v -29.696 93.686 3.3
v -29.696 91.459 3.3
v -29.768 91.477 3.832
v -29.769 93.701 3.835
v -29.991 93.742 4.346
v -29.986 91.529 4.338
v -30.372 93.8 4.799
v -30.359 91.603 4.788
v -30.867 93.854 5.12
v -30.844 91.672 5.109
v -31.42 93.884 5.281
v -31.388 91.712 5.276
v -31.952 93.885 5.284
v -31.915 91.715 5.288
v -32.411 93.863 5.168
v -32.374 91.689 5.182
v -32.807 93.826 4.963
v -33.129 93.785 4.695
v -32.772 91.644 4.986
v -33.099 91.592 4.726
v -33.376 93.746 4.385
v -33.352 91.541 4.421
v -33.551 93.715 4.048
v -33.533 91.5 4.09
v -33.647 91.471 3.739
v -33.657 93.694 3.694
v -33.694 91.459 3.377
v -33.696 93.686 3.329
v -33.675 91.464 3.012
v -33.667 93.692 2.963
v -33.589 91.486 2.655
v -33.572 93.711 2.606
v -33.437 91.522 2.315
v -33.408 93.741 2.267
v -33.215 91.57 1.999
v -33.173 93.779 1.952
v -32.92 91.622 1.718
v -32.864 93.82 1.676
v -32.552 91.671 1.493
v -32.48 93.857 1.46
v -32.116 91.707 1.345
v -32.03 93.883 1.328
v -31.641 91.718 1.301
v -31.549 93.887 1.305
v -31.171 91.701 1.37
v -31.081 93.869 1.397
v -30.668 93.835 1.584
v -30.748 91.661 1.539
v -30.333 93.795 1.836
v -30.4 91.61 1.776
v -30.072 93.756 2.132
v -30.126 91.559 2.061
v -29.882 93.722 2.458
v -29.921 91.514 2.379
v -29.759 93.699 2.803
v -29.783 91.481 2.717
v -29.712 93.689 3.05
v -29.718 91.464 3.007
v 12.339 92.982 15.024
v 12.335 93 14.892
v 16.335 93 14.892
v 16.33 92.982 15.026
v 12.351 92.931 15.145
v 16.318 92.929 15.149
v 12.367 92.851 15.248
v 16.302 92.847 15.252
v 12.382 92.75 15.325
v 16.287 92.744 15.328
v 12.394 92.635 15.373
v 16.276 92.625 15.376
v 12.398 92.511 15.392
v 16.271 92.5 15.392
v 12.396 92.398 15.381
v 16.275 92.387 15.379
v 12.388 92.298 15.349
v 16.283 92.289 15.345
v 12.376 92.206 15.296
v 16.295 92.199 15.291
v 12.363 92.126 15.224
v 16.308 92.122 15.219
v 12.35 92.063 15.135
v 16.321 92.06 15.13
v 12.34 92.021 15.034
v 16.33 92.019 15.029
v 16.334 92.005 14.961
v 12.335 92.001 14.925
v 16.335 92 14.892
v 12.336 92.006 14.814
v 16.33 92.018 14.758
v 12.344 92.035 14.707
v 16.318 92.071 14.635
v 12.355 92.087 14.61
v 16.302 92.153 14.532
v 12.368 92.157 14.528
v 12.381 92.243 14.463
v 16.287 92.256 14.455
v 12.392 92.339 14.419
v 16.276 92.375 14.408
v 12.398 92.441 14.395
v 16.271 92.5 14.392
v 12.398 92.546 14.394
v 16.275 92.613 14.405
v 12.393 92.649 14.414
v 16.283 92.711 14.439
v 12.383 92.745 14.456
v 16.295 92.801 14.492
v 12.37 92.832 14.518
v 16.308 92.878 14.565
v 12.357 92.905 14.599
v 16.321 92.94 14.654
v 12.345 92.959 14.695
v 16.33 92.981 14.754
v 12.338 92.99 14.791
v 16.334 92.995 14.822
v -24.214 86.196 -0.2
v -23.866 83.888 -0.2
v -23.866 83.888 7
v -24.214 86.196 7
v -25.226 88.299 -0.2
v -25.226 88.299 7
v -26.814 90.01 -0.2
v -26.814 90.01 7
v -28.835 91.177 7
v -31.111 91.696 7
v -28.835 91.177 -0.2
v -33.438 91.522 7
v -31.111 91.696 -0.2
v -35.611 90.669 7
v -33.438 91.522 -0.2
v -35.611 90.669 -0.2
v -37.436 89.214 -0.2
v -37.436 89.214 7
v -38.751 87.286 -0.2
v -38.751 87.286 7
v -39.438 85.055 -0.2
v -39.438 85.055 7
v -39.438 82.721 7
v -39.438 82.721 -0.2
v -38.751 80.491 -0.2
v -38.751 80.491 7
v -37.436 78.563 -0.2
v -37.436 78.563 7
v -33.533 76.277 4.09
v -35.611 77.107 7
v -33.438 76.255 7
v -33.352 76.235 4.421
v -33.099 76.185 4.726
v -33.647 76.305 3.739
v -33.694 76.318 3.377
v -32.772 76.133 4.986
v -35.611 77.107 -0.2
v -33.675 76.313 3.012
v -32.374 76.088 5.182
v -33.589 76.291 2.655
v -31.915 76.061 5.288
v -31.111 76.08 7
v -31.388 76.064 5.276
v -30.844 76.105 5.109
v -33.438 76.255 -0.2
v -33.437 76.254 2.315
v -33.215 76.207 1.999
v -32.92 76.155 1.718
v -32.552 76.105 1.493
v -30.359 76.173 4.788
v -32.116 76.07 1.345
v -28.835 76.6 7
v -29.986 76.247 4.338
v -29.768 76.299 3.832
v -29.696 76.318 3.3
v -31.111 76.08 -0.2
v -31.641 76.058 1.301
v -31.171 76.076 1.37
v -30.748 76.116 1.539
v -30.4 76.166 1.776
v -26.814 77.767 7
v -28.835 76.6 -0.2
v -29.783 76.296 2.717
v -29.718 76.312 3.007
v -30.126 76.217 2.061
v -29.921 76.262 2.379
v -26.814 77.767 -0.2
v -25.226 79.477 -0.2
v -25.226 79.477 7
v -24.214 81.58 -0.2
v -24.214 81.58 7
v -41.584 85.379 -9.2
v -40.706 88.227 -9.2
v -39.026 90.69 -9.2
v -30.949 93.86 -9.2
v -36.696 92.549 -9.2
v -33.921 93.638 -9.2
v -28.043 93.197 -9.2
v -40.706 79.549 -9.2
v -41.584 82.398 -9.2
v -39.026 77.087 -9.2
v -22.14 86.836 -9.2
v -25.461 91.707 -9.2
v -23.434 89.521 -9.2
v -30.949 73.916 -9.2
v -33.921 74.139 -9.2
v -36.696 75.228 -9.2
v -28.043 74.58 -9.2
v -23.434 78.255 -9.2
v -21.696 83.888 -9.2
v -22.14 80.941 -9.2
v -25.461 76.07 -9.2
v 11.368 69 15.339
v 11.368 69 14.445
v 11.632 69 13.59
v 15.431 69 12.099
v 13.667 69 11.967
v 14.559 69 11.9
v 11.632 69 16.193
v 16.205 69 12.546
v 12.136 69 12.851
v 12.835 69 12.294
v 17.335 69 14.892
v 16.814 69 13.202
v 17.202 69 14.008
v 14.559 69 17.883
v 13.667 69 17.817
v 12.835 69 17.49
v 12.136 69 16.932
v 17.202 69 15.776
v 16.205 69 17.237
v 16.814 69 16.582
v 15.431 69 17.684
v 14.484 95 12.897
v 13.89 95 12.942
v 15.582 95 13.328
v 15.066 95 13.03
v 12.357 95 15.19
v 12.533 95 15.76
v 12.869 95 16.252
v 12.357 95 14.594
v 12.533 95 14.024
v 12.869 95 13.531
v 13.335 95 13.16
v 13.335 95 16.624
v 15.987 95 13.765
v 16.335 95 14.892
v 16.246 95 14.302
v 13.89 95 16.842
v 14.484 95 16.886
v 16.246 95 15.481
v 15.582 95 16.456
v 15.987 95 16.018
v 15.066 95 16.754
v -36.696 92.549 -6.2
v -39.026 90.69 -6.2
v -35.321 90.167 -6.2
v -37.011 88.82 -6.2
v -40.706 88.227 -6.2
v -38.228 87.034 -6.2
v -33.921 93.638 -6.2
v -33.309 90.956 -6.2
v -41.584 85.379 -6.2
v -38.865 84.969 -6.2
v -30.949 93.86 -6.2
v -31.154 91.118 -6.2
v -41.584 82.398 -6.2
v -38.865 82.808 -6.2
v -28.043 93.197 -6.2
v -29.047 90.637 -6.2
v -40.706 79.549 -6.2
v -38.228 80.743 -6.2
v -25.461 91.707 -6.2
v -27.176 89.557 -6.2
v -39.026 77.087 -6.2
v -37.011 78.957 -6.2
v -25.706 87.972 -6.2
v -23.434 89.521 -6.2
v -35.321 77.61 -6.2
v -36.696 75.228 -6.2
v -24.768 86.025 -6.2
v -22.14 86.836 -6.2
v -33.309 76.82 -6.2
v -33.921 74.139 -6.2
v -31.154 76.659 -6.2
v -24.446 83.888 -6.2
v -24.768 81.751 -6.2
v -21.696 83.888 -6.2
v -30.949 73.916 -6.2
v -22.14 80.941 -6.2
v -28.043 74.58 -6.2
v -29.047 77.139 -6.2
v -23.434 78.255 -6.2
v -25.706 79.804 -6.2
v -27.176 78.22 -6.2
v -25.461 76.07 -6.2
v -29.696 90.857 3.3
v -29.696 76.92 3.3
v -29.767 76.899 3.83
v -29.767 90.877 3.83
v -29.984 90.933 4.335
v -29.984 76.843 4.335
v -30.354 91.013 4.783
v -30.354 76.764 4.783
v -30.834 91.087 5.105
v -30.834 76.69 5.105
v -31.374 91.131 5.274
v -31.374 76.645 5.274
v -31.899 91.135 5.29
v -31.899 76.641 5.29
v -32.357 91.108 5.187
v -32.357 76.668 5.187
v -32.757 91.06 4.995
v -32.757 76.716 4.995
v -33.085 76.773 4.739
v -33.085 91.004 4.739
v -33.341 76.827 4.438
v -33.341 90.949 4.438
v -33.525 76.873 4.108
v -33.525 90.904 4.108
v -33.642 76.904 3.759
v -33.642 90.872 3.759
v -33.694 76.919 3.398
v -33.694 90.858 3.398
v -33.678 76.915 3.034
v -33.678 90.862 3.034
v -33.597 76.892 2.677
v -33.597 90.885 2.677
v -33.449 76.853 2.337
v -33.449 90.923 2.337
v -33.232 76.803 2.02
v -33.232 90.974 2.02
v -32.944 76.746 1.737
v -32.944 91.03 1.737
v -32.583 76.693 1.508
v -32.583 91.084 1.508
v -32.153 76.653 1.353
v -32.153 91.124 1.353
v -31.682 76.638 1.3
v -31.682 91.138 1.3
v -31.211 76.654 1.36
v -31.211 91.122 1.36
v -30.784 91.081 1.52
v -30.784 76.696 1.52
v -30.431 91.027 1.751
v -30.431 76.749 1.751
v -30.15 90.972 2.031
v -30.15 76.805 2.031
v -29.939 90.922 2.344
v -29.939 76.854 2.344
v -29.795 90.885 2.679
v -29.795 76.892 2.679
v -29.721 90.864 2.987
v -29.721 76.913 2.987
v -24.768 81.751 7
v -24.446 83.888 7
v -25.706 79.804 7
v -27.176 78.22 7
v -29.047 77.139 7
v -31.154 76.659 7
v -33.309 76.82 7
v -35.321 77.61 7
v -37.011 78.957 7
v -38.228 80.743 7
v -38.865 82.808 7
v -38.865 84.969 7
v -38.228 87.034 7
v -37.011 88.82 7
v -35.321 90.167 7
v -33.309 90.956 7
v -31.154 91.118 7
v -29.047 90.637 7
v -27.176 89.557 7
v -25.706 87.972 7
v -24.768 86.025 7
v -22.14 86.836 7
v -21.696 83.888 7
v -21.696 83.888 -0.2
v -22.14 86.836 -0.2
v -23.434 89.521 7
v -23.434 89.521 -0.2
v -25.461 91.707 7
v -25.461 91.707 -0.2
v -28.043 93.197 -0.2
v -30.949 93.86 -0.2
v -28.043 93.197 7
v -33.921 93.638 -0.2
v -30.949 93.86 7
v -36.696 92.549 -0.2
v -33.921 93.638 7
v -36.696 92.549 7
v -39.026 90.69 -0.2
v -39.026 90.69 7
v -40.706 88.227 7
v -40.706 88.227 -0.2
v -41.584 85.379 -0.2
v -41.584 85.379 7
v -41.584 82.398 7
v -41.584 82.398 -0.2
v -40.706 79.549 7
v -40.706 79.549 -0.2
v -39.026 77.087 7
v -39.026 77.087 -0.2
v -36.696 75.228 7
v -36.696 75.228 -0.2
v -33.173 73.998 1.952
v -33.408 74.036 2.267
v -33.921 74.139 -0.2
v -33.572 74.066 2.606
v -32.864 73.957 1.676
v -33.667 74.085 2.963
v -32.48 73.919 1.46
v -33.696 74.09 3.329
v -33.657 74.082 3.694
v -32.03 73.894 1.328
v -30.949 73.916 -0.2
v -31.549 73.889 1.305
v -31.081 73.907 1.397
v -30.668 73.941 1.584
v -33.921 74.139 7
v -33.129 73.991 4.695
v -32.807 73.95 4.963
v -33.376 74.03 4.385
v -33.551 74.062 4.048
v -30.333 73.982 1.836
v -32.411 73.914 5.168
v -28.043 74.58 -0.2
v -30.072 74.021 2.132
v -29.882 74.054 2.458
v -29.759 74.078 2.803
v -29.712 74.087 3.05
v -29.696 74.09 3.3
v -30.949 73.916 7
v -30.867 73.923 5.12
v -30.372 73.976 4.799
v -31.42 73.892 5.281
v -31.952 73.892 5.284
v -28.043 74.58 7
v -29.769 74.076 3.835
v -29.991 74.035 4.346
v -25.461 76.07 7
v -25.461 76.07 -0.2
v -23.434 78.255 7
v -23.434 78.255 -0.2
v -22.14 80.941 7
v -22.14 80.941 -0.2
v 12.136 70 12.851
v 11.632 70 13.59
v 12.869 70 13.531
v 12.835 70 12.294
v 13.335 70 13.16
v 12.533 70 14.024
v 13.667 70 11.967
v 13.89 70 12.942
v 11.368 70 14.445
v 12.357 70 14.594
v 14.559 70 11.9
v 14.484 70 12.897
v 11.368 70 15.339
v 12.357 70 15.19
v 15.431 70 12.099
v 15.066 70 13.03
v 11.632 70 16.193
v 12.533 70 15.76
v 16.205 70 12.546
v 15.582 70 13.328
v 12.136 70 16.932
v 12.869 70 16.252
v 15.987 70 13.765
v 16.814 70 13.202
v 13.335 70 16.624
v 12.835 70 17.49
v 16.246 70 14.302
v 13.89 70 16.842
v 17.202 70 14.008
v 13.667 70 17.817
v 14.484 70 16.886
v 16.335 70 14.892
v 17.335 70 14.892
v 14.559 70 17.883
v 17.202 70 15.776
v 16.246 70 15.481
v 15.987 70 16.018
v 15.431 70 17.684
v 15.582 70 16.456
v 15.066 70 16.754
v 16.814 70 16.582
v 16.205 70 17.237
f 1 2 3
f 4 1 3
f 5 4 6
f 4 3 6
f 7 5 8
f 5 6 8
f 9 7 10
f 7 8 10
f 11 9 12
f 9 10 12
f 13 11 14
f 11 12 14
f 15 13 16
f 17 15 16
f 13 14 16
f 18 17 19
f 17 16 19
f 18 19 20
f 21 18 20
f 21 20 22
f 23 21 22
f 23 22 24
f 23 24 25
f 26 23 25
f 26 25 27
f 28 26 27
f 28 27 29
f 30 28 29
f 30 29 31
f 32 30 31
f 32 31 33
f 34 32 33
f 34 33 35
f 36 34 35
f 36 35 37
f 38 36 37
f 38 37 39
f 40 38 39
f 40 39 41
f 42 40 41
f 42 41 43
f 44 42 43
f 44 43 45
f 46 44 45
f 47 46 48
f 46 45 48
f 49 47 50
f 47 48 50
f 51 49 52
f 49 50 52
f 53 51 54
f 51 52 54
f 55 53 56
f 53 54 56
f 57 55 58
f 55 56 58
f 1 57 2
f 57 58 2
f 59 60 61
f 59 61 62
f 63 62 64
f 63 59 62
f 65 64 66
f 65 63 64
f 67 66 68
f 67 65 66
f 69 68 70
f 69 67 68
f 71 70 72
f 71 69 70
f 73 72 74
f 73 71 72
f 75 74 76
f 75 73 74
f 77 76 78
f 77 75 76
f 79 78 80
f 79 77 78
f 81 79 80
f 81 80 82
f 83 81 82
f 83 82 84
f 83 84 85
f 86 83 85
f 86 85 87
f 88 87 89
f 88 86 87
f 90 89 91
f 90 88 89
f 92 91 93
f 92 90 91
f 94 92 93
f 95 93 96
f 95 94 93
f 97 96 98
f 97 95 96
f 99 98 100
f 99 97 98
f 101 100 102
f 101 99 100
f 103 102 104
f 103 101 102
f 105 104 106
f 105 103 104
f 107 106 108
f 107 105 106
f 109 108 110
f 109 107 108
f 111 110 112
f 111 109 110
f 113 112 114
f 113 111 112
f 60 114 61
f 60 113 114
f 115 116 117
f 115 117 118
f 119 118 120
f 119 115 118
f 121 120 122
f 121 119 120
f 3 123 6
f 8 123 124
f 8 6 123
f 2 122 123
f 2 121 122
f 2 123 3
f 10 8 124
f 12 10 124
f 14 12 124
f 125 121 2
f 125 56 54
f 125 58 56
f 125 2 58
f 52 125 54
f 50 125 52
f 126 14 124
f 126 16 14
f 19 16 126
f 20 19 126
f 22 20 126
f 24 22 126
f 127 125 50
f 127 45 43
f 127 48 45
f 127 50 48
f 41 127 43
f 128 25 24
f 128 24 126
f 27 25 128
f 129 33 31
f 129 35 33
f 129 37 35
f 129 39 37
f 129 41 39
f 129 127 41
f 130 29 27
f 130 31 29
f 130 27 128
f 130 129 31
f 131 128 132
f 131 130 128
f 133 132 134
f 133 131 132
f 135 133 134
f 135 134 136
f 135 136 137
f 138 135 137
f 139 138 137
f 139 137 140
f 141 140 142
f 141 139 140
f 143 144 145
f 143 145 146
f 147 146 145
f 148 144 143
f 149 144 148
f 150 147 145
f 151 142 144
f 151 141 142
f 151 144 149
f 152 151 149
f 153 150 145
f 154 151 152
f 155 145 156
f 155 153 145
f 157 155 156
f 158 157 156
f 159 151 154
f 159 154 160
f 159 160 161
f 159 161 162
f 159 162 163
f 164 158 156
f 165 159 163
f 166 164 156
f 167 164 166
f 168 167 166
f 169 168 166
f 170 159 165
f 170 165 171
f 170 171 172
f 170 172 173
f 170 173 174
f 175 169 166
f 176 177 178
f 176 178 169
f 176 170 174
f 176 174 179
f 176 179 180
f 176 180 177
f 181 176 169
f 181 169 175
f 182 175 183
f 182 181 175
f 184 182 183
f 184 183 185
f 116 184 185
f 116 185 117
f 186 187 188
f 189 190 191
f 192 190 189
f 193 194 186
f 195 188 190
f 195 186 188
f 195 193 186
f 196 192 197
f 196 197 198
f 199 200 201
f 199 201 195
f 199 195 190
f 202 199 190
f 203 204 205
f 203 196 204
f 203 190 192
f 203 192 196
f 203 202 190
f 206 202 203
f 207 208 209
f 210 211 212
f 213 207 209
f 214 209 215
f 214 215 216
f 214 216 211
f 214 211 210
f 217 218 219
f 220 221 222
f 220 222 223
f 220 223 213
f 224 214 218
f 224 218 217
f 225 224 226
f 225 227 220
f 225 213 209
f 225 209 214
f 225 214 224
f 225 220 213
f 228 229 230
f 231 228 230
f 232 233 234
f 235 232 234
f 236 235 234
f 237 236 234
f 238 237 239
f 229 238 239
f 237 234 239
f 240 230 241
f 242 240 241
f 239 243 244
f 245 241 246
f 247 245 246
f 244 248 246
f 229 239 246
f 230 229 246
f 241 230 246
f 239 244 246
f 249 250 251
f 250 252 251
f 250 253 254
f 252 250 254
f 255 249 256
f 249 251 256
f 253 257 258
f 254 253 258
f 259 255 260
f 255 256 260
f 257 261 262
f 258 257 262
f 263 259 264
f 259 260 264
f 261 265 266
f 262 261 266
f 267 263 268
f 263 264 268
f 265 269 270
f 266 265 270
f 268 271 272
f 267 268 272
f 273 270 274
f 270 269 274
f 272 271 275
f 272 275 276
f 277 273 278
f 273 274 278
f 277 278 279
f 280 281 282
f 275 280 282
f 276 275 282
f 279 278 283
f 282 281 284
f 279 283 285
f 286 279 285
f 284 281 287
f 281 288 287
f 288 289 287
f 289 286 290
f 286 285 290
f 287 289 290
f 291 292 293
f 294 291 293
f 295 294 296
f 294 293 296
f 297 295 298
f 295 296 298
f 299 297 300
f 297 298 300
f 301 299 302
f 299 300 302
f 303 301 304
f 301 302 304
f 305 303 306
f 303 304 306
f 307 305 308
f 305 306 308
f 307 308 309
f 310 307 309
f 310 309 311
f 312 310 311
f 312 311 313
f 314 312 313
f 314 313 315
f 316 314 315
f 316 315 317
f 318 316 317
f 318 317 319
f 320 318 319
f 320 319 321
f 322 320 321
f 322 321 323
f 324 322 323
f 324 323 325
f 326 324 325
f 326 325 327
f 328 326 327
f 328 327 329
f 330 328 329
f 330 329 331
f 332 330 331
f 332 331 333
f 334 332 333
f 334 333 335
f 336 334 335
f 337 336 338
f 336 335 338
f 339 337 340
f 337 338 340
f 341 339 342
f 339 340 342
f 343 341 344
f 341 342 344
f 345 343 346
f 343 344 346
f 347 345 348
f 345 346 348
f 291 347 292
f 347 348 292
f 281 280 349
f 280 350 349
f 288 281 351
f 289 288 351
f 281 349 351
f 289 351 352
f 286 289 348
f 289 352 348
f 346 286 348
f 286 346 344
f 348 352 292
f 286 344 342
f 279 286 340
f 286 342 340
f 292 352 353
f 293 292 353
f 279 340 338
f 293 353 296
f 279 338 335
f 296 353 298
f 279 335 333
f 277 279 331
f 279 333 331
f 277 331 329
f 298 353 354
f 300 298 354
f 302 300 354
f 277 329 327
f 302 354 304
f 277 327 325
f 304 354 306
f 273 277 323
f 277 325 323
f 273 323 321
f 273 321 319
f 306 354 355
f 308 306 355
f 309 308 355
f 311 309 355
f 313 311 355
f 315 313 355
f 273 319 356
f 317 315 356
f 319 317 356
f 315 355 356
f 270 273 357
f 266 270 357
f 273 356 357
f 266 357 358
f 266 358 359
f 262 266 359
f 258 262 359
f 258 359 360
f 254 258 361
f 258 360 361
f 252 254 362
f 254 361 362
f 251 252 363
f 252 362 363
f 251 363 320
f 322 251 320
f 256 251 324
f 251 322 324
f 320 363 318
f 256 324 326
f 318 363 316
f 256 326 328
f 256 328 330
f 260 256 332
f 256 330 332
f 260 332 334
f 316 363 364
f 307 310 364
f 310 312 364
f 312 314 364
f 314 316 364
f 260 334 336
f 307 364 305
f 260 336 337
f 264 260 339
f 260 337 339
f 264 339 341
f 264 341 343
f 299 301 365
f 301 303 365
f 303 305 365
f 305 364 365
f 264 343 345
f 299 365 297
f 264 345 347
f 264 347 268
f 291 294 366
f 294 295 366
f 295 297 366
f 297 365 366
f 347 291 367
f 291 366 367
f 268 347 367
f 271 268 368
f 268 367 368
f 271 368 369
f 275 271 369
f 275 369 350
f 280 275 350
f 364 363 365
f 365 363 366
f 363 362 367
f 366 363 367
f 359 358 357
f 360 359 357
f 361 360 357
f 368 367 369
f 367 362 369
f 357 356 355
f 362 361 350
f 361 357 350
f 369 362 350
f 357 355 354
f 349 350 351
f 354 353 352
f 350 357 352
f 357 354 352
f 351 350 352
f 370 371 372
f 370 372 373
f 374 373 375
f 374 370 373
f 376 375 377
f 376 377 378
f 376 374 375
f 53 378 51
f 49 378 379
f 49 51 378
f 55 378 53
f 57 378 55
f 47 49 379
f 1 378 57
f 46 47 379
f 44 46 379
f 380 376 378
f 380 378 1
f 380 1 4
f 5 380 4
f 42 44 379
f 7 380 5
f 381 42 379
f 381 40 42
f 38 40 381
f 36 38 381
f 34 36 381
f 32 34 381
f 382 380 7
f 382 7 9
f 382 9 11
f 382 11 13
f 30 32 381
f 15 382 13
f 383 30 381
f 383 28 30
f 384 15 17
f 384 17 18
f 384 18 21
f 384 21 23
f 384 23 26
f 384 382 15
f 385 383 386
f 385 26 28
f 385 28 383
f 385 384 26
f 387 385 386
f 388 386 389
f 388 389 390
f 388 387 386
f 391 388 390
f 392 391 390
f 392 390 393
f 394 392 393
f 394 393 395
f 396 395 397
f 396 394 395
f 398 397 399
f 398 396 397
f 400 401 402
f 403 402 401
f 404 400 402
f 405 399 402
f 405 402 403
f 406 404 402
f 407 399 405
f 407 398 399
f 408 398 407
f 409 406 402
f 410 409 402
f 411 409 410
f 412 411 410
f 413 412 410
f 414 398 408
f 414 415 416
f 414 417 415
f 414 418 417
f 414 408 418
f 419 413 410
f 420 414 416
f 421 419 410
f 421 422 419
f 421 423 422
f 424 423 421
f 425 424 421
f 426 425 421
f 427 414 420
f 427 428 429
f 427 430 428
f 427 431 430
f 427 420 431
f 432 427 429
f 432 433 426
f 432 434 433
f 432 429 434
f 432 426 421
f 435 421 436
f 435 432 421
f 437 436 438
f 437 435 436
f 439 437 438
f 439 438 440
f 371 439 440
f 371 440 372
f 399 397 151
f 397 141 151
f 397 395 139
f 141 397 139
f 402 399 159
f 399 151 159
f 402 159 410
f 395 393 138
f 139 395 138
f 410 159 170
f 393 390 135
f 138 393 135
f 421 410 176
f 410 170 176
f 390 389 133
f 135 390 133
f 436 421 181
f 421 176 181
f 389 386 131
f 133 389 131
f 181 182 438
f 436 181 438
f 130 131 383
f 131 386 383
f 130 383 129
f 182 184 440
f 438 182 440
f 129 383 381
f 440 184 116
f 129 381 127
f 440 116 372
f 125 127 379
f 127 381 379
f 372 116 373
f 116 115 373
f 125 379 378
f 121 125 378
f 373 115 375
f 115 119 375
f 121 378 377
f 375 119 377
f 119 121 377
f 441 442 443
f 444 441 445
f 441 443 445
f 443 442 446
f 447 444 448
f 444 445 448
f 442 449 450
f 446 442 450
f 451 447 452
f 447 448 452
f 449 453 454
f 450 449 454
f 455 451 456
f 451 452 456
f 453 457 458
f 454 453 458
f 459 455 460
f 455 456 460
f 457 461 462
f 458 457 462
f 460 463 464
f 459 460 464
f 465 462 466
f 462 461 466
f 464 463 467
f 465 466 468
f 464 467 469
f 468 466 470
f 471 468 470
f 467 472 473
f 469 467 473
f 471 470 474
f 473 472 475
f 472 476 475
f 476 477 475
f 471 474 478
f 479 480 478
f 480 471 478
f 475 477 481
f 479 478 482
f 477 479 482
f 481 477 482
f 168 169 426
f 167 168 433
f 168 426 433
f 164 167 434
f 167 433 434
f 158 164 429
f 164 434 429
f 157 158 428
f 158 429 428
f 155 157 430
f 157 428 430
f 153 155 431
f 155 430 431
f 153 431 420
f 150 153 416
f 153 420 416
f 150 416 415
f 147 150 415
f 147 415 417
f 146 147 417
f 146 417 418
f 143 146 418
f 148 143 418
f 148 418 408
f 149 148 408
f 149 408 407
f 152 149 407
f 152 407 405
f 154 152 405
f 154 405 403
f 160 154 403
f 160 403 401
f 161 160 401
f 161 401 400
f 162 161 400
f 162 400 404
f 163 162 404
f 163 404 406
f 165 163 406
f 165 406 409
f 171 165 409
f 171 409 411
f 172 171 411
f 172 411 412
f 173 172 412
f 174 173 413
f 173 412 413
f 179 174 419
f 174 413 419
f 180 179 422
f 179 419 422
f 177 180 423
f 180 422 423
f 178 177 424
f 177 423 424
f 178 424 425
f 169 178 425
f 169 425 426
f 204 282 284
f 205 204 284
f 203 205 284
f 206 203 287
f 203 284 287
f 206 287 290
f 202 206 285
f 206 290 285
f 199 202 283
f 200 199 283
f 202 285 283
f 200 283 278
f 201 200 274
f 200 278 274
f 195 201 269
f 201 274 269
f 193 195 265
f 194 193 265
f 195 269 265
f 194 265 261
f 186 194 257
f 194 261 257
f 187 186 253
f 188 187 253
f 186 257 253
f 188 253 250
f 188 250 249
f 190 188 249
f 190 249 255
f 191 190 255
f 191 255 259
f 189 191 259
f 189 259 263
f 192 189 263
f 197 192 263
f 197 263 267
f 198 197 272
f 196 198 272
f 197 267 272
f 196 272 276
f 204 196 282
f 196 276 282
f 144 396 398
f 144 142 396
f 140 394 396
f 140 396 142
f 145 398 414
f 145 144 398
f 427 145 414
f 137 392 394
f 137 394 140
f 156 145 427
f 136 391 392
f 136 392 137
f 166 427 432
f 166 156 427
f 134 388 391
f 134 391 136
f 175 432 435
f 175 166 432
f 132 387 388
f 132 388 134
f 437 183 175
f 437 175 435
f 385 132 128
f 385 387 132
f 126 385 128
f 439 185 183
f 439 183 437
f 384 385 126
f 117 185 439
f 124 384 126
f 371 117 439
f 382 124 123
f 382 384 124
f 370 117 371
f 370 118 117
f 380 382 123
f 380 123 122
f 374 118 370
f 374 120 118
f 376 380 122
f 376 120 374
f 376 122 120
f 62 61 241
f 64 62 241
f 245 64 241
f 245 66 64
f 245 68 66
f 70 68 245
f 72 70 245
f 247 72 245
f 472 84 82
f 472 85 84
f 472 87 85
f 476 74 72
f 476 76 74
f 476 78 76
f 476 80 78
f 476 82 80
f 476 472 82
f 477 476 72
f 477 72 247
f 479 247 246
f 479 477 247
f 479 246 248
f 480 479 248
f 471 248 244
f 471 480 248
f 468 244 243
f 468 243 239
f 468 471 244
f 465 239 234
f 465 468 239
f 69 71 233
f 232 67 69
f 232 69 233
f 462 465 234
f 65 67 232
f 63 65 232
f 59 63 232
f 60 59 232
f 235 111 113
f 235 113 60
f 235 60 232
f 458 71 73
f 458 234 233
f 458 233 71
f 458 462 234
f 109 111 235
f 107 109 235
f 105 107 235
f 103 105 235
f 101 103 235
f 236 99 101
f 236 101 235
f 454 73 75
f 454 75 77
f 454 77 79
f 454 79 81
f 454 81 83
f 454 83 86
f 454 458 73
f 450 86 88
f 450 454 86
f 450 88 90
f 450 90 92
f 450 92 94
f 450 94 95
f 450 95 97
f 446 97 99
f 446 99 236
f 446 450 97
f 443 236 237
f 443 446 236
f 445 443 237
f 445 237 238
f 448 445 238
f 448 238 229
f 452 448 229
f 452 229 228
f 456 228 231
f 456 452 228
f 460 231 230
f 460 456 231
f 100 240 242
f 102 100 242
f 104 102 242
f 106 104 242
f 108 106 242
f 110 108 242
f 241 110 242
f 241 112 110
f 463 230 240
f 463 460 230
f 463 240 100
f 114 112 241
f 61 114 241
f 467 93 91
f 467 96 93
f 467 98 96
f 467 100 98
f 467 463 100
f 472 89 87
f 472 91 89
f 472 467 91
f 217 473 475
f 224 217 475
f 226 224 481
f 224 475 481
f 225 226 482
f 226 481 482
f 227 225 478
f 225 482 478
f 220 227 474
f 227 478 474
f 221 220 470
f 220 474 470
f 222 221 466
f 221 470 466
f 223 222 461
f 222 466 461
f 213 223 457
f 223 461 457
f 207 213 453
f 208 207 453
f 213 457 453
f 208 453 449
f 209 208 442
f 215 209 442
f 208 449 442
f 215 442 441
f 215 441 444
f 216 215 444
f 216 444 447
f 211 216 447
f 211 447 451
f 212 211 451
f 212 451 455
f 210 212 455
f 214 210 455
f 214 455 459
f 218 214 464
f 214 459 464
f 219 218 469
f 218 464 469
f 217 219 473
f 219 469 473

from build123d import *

# Parameters (mm, degrees)
F0_R          = 10
F0_R_2        = 7.83
F1_DEPTH      = 7
F1_DEPTH_BACK = 0.2
F3_R          = 7.25
F4_DEPTH      = 7.2
F4_DEPTH_BACK = 6
F5_START      = 6
F3_R_2        = 10
F3_R_3        = 7.83
F5_DEPTH      = 3
F2_R          = 2
F10_DEPTH     = 93.8892550597
F7_R          = 2
F11_DEPTH     = 25
F7_R_2        = 3
F12_DEPTH     = 1
F13_R         = 0.5
F14_DEPTH     = 25


# Not quite as in the source:
# - a feature of the source that left no trace in its solid (it failed there, or was rolled back) is left out


with BuildPart() as f1:
    # F0 (on Top) → F1 (new body, two sides)
    with BuildSketch(Plane.XY) as f1_sk:
        with Locations((-31.695947051, 83.8882550597)):
            Circle(F0_R)
        with Locations((-31.695947051, 83.8882550597)):
            Circle(F0_R_2, mode=Mode.SUBTRACT)
    extrude(amount=F1_DEPTH)
    extrude(f1_sk.sketch, amount=-F1_DEPTH_BACK)


with BuildPart() as f4:
    # F3 (on face) → F4 (new body, two sides)
    with BuildSketch(Plane(origin=(0, 0, -0.2), x_dir=(1, 0, 0), z_dir=(0, 0, -1))) as f4_sk:
        with Locations((-31.695947051, -83.8882550597)):
            Circle(F3_R)
    extrude(amount=-F4_DEPTH)
    extrude(f4_sk.sketch, amount=F4_DEPTH_BACK)

    # F3 (on face) → F5 (join)
    with BuildSketch(Plane(origin=(0, 0, -0.2), x_dir=(1, 0, 0), z_dir=(0, 0, -1)).offset(F5_START)):
        with Locations((-31.695947051, -83.8882550597)):
            Circle(F3_R_2)
        with Locations((-31.695947051, -83.8882550597)):
            Circle(F3_R_3, mode=Mode.SUBTRACT)
        with Locations((-31.695947051, -83.8882550597)):
            Circle(F3_R_3)
        with Locations((-31.695947051, -83.8882550597)):
            Circle(F3_R, mode=Mode.SUBTRACT)
        with Locations((-31.695947051, -83.8882550597)):
            Circle(F3_R)
    extrude(amount=F5_DEPTH)


with BuildPart() as f10_tool:
    # F2 (on Front) → F10 (new body, through all)
    with BuildSketch(Plane.XZ):
        with Locations((-31.695947051, 3.3)):
            Circle(F2_R)
    extrude(amount=-F10_DEPTH)


with BuildPart() as f1_1:
    add(f1.part)

    # F10: cut by f10_tool
    add(f10_tool.part, mode=Mode.SUBTRACT)


with BuildPart() as f4_1:
    add(f4.part)

    # F10: cut by f10_tool
    add(f10_tool.part, mode=Mode.SUBTRACT)


with BuildPart() as f11:
    # F7 (on offset) → F11 (new body)
    with BuildSketch(Plane.XZ.offset(-70)):
        with Locations((14.3349738792, 14.8918386549)):
            Circle(F7_R)
    extrude(amount=-F11_DEPTH)

    # F7 (on offset) → F12 (join)
    with BuildSketch(Plane.XZ.offset(-70)):
        with Locations((14.3349738792, 14.8918386549)):
            Circle(F7_R_2)
        with Locations((14.3349738792, 14.8918386549)):
            Circle(F7_R, mode=Mode.SUBTRACT)
        with Locations((14.3349738792, 14.8918386549)):
            Circle(F7_R)
    extrude(amount=F12_DEPTH)

    # F13 (on Right) → F14 (cut)
    with BuildSketch(Plane.YZ):
        with Locations((92.5, 14.8918386549)):
            Circle(F13_R)
    extrude(amount=F14_DEPTH, mode=Mode.SUBTRACT)


solid = Compound([f1_1.part, f4_1.part, f11.part])
